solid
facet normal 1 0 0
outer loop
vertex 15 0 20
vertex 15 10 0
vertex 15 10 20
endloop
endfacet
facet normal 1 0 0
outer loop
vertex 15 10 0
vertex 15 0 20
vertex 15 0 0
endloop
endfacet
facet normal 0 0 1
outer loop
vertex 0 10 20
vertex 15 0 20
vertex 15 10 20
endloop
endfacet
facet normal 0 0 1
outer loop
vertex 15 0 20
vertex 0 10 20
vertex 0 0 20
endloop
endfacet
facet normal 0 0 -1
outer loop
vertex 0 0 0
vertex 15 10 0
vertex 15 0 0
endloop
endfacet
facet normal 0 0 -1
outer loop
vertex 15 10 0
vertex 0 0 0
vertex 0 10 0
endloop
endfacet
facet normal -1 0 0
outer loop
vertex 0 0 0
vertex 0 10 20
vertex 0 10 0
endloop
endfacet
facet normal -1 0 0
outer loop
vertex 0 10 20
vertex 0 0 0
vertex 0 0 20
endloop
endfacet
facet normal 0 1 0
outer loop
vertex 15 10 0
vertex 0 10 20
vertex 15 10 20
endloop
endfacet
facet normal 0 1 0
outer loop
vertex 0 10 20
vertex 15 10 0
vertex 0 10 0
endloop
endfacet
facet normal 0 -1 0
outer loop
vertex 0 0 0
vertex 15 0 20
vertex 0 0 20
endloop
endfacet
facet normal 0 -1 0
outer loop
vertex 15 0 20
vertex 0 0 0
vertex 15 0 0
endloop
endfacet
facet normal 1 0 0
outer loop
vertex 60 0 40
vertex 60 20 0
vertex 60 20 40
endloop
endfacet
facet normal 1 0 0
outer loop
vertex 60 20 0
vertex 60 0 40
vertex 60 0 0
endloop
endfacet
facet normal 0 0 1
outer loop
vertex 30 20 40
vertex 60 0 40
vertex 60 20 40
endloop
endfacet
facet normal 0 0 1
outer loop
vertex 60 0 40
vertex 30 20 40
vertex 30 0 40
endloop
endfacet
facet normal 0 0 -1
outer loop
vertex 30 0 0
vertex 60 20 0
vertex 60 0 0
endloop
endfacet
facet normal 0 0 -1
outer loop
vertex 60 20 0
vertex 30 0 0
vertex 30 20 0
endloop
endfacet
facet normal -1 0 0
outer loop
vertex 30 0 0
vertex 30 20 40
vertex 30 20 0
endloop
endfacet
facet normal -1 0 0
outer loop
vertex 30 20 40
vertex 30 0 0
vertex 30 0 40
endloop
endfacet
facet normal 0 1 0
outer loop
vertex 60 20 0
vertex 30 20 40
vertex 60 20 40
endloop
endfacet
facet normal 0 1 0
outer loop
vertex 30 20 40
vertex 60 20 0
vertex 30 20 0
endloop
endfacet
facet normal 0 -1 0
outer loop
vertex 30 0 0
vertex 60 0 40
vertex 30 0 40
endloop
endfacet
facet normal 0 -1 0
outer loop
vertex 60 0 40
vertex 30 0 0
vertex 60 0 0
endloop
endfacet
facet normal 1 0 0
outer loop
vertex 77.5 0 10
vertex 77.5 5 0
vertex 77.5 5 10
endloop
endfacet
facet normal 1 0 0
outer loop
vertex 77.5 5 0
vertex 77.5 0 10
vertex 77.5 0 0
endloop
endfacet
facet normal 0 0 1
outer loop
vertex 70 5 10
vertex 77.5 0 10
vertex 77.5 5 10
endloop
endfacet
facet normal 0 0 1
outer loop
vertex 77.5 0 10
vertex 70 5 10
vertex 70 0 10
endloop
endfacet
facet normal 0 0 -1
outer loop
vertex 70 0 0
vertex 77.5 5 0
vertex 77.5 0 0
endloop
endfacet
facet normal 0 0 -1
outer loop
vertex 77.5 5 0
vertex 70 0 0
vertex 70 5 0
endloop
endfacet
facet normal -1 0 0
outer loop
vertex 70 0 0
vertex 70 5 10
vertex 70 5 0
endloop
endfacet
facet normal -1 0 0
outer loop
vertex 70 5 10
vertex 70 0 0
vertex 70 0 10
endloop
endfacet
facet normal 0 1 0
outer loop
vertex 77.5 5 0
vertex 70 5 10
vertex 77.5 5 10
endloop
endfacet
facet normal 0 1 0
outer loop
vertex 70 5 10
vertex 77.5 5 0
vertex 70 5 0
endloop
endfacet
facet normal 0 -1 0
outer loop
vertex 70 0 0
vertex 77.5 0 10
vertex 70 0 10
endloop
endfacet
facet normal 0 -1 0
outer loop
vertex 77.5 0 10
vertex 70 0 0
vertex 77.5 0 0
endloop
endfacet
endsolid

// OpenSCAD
scale = 1;
cube([15*scale, 10*scale, 20*scale]);

scale2 = 2;
translate([30, 0, 0])
  cube([15*scale2, 10*scale2, 20*scale2]);

scale3 = 0.5;
translate([70, 0, 0])
  cube([15*scale3, 10*scale3, 20*scale3]);
